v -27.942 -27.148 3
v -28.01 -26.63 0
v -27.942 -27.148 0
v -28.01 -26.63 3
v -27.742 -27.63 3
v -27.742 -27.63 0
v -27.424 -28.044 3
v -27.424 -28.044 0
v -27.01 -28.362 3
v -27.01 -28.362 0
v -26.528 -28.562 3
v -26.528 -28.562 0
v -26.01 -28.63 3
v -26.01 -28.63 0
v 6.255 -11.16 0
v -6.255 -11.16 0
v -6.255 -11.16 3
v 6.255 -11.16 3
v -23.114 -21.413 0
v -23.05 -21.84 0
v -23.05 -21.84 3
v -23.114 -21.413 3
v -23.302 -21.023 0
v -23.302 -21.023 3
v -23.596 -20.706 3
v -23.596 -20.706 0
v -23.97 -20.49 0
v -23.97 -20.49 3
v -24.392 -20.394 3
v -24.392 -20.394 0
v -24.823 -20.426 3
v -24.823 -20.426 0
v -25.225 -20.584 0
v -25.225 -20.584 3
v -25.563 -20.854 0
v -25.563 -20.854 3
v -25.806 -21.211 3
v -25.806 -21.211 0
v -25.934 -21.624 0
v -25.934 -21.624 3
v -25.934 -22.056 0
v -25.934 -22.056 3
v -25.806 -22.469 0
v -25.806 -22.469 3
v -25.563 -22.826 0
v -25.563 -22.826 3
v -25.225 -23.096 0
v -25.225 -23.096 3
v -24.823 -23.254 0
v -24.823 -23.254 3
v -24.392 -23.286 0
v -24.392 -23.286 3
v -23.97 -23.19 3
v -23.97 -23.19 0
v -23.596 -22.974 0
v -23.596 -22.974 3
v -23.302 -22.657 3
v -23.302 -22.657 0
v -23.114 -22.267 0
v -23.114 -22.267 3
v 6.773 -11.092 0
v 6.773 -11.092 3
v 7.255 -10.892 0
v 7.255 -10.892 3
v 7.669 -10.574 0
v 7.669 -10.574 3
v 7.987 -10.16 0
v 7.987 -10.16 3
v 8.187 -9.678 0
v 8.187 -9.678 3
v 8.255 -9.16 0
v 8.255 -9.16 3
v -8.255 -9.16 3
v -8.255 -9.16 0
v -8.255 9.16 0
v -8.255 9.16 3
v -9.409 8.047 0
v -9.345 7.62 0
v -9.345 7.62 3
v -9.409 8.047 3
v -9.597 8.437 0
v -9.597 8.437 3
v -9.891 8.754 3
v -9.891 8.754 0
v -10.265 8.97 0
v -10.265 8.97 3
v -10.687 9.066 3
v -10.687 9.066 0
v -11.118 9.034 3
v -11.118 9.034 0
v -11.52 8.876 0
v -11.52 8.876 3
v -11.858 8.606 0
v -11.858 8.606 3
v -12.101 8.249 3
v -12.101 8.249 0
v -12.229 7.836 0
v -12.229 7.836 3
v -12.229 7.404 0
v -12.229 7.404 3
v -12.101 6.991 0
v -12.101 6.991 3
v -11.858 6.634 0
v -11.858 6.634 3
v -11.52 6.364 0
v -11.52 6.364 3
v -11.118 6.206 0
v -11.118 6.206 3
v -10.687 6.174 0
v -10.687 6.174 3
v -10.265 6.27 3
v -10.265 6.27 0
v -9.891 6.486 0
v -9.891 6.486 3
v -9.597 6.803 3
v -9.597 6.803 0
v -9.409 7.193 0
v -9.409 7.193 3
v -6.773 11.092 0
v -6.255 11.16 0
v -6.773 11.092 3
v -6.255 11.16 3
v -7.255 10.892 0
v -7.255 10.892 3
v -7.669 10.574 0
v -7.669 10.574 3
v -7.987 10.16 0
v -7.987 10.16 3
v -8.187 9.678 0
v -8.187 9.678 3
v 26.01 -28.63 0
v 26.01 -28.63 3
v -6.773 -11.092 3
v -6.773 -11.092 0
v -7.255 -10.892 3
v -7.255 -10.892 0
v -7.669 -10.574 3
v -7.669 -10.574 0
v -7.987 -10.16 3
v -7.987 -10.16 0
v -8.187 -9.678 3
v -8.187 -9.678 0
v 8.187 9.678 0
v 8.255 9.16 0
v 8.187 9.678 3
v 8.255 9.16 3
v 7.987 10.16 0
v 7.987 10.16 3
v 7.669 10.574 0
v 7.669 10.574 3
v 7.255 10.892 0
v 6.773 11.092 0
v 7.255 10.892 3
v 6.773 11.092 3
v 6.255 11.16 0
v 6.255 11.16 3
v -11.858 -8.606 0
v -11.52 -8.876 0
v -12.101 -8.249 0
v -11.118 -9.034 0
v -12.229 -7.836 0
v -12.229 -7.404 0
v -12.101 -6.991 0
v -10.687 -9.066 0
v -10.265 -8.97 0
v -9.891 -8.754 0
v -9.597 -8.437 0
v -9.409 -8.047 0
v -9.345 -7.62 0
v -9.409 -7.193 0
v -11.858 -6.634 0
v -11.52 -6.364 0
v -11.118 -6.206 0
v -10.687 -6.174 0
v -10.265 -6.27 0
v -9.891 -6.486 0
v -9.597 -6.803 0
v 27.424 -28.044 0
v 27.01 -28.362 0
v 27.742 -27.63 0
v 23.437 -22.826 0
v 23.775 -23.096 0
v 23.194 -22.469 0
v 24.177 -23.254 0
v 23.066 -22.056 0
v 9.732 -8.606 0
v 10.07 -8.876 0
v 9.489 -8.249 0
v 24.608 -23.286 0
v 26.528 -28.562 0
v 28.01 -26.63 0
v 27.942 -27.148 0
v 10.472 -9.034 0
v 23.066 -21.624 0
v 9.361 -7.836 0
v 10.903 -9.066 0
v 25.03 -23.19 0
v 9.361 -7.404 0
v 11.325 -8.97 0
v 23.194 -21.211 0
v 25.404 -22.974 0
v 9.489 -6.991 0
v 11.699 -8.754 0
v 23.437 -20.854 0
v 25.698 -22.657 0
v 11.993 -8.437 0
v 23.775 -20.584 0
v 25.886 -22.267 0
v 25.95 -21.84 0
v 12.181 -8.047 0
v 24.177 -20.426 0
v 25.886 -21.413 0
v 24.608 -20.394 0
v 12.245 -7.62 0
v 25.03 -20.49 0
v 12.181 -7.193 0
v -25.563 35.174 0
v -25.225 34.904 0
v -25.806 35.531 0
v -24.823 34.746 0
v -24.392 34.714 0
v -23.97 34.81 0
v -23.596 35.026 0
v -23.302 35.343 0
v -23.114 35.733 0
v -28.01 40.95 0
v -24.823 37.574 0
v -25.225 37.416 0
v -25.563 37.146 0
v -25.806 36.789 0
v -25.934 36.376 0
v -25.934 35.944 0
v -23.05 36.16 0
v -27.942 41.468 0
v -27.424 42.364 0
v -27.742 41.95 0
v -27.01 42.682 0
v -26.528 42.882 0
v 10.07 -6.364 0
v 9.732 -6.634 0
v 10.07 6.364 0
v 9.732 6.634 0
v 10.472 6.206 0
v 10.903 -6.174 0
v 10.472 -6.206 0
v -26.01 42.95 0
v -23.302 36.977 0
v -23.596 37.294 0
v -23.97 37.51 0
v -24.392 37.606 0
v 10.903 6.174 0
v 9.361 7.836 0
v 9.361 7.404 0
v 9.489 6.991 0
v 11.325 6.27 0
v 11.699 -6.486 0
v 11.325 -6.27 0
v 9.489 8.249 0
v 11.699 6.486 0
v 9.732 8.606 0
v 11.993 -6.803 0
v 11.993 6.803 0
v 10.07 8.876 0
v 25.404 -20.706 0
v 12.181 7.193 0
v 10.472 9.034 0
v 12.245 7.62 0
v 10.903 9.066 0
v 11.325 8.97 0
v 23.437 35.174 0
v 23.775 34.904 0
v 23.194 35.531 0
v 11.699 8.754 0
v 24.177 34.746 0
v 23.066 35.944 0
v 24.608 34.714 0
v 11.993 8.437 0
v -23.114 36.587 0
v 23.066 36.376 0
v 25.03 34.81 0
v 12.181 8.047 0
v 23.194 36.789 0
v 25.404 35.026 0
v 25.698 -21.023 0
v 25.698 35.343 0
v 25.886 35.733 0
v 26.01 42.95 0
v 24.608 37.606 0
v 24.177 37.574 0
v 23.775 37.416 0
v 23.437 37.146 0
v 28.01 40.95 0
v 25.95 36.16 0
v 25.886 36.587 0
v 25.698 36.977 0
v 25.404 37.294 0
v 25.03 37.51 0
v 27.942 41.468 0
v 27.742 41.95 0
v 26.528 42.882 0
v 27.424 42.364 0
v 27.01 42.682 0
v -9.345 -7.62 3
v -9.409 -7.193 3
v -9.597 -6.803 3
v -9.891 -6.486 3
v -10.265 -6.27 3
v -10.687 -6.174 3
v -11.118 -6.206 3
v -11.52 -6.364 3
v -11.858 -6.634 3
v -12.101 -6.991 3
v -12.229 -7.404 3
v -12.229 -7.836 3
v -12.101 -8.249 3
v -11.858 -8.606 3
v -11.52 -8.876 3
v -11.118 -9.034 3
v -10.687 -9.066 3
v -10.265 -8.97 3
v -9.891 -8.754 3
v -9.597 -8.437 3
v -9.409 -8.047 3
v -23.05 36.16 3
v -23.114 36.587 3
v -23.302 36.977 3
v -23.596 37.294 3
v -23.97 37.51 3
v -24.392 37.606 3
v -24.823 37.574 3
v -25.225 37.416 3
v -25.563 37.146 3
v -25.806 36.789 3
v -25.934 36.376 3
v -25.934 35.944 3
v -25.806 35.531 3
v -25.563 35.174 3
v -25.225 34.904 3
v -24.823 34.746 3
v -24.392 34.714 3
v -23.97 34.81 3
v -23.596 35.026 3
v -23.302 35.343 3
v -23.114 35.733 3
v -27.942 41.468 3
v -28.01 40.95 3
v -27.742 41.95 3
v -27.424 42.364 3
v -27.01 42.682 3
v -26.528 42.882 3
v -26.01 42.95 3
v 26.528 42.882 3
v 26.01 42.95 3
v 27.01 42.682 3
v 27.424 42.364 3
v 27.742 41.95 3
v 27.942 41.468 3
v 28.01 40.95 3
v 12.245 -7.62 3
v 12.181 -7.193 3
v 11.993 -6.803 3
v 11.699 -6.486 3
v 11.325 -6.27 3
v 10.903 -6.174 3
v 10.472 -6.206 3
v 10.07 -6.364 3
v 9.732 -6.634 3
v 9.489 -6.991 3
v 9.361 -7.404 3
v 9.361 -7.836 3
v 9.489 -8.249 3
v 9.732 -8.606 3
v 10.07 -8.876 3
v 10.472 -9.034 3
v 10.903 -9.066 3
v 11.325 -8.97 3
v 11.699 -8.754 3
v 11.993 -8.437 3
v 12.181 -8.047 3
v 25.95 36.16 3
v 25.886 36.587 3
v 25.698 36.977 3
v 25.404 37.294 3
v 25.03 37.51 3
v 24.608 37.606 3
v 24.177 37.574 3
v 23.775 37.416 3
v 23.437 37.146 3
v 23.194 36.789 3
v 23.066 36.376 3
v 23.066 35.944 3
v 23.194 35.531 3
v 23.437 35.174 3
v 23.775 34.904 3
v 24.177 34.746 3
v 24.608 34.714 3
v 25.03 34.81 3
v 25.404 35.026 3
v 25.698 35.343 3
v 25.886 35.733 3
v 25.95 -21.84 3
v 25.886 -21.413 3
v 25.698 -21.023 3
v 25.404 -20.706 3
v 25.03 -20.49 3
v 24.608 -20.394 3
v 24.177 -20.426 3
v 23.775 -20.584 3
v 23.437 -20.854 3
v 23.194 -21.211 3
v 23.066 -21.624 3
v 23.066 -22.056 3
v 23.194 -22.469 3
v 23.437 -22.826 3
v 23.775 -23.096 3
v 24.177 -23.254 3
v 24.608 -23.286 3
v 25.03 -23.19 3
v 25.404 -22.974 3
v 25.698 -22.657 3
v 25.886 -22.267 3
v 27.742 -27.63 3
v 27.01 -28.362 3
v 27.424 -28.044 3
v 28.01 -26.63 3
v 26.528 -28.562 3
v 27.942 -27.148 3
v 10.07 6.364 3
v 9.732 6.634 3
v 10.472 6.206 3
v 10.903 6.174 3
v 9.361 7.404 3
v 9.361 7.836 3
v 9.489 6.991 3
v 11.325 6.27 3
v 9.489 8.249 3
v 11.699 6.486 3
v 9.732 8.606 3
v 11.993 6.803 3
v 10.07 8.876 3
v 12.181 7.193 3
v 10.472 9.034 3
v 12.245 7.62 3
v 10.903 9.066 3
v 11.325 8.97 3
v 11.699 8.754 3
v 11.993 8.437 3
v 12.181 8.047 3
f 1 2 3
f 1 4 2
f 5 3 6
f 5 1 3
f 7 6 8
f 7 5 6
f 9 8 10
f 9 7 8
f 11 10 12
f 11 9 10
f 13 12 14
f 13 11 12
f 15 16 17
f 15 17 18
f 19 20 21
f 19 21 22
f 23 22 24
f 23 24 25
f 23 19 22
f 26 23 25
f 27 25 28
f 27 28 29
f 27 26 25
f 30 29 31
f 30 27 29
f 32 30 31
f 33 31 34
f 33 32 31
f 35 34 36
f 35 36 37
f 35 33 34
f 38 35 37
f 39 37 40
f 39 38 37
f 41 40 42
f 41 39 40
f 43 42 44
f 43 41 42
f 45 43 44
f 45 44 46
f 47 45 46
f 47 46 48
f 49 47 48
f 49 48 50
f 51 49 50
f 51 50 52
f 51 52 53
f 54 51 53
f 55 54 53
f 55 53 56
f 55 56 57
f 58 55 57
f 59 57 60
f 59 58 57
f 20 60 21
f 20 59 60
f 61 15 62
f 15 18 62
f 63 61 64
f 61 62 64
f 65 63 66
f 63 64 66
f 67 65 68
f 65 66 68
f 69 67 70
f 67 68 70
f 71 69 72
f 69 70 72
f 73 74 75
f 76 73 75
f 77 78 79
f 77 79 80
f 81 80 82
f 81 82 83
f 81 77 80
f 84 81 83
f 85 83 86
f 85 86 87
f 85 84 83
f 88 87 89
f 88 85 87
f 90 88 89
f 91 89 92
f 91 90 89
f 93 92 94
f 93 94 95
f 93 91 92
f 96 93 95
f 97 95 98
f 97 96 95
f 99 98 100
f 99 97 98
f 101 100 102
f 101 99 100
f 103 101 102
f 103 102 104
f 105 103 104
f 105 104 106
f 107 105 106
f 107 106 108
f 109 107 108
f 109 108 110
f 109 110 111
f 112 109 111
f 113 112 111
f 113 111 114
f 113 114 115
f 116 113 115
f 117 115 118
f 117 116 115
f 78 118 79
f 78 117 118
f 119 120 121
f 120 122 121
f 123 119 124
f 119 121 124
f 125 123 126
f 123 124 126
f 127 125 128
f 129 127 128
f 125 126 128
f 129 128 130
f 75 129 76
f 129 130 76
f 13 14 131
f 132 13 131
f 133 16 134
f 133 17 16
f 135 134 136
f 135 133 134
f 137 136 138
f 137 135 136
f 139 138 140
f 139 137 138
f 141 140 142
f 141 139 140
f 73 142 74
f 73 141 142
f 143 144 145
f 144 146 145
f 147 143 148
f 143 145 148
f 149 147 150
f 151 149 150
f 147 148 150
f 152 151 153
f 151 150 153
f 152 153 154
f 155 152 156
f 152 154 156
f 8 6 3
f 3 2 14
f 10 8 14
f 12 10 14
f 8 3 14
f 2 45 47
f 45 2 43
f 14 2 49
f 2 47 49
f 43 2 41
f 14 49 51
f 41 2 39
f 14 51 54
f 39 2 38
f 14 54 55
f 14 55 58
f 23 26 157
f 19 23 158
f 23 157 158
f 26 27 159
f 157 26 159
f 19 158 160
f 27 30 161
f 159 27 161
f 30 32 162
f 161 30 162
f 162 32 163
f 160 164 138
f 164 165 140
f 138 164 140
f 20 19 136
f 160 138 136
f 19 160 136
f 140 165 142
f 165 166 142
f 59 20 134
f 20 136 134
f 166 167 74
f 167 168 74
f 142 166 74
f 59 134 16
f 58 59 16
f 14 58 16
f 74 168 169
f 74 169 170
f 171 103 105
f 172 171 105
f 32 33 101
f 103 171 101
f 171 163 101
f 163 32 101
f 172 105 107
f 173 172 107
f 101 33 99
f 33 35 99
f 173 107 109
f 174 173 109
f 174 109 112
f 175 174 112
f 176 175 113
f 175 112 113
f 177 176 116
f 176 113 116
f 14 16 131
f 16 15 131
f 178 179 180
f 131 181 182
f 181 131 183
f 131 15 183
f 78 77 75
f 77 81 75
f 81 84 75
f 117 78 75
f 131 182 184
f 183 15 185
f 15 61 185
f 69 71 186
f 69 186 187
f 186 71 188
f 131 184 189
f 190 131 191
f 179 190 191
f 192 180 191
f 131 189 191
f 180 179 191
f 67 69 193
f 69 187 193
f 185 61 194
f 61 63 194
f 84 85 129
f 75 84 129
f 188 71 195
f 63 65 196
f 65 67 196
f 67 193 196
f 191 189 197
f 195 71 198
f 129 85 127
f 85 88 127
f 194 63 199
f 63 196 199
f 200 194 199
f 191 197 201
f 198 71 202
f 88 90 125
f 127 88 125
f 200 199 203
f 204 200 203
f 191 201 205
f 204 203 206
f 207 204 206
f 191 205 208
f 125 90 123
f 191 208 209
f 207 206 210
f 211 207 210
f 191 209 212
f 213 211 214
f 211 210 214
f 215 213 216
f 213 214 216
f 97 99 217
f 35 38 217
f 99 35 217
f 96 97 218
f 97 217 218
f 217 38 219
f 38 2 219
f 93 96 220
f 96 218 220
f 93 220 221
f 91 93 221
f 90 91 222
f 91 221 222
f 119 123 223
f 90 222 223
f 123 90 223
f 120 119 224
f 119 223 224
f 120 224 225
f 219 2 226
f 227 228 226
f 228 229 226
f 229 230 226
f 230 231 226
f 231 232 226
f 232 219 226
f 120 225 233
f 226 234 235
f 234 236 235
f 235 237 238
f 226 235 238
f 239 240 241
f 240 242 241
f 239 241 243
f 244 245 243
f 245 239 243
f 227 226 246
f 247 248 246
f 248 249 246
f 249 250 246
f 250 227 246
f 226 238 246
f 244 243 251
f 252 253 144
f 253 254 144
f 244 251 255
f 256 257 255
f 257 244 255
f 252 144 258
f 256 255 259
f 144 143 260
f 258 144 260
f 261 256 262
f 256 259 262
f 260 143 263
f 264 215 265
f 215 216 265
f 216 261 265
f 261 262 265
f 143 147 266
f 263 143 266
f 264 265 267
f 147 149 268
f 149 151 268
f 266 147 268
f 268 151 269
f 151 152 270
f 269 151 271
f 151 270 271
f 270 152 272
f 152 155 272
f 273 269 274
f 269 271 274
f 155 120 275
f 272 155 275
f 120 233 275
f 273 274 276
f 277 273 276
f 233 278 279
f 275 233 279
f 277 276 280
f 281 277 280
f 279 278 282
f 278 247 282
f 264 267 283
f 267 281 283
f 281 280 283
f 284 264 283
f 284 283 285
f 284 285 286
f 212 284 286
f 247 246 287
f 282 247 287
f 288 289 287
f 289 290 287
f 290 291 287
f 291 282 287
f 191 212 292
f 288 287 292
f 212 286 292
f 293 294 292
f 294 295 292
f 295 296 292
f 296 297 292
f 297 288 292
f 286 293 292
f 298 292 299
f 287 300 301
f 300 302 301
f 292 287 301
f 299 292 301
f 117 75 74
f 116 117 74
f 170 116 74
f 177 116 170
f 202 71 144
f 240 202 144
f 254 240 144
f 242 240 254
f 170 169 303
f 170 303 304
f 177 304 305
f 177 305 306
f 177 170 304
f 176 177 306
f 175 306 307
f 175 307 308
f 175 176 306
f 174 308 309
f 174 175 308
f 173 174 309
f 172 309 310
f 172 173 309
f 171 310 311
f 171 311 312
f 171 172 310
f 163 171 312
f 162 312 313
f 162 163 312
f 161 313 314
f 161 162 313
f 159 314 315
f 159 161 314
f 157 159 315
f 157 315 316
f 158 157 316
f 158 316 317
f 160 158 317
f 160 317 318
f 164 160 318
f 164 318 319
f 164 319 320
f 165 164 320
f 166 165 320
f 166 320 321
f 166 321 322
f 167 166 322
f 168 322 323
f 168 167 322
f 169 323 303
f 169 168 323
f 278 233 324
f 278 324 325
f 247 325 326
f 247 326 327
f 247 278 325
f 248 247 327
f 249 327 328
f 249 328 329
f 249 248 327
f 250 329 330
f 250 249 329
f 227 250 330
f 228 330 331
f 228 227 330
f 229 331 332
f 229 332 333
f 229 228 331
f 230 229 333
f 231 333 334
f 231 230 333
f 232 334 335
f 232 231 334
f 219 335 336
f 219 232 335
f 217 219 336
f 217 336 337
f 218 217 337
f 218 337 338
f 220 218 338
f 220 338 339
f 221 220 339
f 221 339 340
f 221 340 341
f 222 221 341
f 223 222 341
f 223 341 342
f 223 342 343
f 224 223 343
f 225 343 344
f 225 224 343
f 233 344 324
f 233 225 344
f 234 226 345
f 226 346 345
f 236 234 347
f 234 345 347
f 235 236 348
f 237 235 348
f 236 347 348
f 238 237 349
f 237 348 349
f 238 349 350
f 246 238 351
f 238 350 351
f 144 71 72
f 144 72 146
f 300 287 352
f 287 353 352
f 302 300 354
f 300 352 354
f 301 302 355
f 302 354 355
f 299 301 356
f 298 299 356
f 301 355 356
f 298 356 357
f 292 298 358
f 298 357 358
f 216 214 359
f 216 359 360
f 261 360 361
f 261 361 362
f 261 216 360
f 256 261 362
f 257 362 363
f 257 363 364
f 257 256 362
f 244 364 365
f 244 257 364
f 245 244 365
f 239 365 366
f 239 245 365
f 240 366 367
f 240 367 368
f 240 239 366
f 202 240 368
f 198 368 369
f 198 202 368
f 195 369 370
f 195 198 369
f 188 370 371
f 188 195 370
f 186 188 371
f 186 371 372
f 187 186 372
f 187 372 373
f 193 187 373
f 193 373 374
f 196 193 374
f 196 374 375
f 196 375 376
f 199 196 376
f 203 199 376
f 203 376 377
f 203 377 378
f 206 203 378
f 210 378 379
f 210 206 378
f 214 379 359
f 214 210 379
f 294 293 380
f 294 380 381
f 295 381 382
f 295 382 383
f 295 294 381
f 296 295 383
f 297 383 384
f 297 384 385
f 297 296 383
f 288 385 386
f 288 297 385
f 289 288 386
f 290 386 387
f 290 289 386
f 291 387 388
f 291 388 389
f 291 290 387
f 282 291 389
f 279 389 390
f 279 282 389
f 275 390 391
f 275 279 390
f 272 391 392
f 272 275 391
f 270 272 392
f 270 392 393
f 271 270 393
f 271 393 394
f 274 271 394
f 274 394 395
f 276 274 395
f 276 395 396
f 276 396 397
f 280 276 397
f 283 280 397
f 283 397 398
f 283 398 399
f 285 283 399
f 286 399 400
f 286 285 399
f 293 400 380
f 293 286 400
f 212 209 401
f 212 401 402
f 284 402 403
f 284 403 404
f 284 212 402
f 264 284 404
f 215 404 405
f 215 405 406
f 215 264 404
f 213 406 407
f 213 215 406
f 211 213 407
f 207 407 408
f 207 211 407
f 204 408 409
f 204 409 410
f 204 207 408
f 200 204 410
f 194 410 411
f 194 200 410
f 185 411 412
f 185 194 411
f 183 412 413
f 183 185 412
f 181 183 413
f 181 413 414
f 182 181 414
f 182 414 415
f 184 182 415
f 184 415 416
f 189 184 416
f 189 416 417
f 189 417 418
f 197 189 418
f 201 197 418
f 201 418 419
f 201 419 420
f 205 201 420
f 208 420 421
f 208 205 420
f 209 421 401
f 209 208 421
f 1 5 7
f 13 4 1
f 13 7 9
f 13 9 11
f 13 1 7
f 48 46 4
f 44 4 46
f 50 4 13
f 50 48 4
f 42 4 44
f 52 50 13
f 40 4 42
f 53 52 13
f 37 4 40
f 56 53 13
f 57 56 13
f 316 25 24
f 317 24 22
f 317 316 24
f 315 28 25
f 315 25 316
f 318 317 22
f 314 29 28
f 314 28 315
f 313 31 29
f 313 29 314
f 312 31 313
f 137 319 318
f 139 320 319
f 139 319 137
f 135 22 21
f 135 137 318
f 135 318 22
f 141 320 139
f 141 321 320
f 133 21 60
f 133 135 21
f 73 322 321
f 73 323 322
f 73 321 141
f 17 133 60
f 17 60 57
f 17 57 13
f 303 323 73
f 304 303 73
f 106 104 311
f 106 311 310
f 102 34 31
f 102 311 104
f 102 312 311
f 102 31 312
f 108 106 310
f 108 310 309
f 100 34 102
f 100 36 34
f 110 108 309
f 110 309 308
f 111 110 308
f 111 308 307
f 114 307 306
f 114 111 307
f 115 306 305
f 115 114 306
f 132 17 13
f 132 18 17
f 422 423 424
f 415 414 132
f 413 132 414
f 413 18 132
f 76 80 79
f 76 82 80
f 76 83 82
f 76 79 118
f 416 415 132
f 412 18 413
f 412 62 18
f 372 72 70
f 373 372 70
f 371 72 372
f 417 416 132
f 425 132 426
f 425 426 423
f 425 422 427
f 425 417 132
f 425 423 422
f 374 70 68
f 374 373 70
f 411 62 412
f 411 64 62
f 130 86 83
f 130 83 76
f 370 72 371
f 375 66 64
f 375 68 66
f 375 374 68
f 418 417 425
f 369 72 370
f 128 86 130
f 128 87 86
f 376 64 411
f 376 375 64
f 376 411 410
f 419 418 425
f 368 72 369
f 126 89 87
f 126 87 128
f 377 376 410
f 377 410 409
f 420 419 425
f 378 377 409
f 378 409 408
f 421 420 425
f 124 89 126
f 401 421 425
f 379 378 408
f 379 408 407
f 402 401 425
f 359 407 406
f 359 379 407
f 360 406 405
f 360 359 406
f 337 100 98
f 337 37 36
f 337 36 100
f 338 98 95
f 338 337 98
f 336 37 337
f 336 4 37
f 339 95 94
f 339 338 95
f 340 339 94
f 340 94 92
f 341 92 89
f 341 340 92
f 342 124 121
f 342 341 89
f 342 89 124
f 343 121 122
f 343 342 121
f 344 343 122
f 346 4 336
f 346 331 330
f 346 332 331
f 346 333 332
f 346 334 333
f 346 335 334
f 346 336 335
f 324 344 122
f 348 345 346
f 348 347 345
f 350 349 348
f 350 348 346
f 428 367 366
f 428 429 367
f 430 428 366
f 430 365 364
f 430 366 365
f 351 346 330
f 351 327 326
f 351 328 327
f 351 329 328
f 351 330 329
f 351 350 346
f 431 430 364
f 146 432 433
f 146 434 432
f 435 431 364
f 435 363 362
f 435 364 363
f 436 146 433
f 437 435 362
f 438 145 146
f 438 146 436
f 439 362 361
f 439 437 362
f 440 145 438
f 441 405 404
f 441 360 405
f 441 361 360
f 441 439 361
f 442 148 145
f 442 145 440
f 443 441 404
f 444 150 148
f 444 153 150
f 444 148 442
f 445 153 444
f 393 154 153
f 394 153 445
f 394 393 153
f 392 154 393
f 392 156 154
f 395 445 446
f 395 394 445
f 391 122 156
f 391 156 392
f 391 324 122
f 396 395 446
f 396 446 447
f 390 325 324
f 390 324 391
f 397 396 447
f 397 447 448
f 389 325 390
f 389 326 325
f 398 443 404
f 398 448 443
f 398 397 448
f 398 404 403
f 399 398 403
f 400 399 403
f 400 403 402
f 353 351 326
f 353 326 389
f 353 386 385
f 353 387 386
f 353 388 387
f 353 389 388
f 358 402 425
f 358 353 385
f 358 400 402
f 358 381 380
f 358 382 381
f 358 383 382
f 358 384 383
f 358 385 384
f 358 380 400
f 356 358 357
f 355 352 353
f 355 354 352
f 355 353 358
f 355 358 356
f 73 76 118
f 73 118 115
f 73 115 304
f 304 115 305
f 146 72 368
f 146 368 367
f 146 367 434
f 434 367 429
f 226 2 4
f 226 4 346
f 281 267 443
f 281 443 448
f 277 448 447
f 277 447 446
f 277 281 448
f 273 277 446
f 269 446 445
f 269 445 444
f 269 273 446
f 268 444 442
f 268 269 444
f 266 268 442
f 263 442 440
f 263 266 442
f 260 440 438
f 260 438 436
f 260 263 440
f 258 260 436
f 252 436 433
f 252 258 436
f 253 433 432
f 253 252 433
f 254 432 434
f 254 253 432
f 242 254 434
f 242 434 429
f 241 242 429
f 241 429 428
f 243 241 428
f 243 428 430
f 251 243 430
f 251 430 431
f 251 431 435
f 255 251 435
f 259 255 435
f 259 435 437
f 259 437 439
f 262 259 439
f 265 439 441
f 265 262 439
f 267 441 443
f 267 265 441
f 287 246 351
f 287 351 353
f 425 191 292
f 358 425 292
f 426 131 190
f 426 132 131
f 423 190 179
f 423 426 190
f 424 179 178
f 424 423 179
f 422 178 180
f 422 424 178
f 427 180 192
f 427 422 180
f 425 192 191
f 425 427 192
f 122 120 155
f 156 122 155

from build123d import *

# Parameters (mm, degrees)
SKETCH1_W           = 56.02
SKETCH1_H           = 71.58
SKETCH1_R           = 1.45
SKETCH1_W_2         = 16.51
SKETCH1_H_2         = 22.32
BOSS_EXTRUDE1_DEPTH = 3
FILLET1_R           = 2


with BuildPart() as part:
    # Sketch1 → Boss-Extrude1 (new body)
    with BuildSketch(Plane.XY):
        with Locations((0, 7.16)):
            Rectangle(SKETCH1_W, SKETCH1_H)
        with Locations((-10.795, -7.62)):
            Circle(SKETCH1_R, mode=Mode.SUBTRACT)
        with Locations((-10.795, 7.62)):
            Circle(SKETCH1_R, mode=Mode.SUBTRACT)
        with Locations((10.795, 7.62)):
            Circle(SKETCH1_R, mode=Mode.SUBTRACT)
        with Locations((10.795, -7.62)):
            Circle(SKETCH1_R, mode=Mode.SUBTRACT)
        with Locations((24.5, -21.84)):
            Circle(SKETCH1_R, mode=Mode.SUBTRACT)
        with Locations((-24.5, 36.16)):
            Circle(SKETCH1_R, mode=Mode.SUBTRACT)
        with Locations((-24.5, -21.84)):
            Circle(SKETCH1_R, mode=Mode.SUBTRACT)
        with Locations((24.5, 36.16)):
            Circle(SKETCH1_R, mode=Mode.SUBTRACT)
        Rectangle(SKETCH1_W_2, SKETCH1_H_2, mode=Mode.SUBTRACT)
    extrude(amount=BOSS_EXTRUDE1_DEPTH)

    # Fillet1
    fillet1_edges = [part.edges().sort_by_distance(p)[0] for p in [
        (-8.255, 11.16, 1.5),
        (-8.255, -11.16, 1.5),
        (8.255, -11.16, 1.5),
        (8.255, 11.16, 1.5),
        (-28.01, 42.95, 1.5),
        (28.01, 42.95, 1.5),
        (28.01, -28.63, 1.5),
        (-28.01, -28.63, 1.5),
    ]]
    fillet(fillet1_edges, radius=FILLET1_R)


solid = part.part
